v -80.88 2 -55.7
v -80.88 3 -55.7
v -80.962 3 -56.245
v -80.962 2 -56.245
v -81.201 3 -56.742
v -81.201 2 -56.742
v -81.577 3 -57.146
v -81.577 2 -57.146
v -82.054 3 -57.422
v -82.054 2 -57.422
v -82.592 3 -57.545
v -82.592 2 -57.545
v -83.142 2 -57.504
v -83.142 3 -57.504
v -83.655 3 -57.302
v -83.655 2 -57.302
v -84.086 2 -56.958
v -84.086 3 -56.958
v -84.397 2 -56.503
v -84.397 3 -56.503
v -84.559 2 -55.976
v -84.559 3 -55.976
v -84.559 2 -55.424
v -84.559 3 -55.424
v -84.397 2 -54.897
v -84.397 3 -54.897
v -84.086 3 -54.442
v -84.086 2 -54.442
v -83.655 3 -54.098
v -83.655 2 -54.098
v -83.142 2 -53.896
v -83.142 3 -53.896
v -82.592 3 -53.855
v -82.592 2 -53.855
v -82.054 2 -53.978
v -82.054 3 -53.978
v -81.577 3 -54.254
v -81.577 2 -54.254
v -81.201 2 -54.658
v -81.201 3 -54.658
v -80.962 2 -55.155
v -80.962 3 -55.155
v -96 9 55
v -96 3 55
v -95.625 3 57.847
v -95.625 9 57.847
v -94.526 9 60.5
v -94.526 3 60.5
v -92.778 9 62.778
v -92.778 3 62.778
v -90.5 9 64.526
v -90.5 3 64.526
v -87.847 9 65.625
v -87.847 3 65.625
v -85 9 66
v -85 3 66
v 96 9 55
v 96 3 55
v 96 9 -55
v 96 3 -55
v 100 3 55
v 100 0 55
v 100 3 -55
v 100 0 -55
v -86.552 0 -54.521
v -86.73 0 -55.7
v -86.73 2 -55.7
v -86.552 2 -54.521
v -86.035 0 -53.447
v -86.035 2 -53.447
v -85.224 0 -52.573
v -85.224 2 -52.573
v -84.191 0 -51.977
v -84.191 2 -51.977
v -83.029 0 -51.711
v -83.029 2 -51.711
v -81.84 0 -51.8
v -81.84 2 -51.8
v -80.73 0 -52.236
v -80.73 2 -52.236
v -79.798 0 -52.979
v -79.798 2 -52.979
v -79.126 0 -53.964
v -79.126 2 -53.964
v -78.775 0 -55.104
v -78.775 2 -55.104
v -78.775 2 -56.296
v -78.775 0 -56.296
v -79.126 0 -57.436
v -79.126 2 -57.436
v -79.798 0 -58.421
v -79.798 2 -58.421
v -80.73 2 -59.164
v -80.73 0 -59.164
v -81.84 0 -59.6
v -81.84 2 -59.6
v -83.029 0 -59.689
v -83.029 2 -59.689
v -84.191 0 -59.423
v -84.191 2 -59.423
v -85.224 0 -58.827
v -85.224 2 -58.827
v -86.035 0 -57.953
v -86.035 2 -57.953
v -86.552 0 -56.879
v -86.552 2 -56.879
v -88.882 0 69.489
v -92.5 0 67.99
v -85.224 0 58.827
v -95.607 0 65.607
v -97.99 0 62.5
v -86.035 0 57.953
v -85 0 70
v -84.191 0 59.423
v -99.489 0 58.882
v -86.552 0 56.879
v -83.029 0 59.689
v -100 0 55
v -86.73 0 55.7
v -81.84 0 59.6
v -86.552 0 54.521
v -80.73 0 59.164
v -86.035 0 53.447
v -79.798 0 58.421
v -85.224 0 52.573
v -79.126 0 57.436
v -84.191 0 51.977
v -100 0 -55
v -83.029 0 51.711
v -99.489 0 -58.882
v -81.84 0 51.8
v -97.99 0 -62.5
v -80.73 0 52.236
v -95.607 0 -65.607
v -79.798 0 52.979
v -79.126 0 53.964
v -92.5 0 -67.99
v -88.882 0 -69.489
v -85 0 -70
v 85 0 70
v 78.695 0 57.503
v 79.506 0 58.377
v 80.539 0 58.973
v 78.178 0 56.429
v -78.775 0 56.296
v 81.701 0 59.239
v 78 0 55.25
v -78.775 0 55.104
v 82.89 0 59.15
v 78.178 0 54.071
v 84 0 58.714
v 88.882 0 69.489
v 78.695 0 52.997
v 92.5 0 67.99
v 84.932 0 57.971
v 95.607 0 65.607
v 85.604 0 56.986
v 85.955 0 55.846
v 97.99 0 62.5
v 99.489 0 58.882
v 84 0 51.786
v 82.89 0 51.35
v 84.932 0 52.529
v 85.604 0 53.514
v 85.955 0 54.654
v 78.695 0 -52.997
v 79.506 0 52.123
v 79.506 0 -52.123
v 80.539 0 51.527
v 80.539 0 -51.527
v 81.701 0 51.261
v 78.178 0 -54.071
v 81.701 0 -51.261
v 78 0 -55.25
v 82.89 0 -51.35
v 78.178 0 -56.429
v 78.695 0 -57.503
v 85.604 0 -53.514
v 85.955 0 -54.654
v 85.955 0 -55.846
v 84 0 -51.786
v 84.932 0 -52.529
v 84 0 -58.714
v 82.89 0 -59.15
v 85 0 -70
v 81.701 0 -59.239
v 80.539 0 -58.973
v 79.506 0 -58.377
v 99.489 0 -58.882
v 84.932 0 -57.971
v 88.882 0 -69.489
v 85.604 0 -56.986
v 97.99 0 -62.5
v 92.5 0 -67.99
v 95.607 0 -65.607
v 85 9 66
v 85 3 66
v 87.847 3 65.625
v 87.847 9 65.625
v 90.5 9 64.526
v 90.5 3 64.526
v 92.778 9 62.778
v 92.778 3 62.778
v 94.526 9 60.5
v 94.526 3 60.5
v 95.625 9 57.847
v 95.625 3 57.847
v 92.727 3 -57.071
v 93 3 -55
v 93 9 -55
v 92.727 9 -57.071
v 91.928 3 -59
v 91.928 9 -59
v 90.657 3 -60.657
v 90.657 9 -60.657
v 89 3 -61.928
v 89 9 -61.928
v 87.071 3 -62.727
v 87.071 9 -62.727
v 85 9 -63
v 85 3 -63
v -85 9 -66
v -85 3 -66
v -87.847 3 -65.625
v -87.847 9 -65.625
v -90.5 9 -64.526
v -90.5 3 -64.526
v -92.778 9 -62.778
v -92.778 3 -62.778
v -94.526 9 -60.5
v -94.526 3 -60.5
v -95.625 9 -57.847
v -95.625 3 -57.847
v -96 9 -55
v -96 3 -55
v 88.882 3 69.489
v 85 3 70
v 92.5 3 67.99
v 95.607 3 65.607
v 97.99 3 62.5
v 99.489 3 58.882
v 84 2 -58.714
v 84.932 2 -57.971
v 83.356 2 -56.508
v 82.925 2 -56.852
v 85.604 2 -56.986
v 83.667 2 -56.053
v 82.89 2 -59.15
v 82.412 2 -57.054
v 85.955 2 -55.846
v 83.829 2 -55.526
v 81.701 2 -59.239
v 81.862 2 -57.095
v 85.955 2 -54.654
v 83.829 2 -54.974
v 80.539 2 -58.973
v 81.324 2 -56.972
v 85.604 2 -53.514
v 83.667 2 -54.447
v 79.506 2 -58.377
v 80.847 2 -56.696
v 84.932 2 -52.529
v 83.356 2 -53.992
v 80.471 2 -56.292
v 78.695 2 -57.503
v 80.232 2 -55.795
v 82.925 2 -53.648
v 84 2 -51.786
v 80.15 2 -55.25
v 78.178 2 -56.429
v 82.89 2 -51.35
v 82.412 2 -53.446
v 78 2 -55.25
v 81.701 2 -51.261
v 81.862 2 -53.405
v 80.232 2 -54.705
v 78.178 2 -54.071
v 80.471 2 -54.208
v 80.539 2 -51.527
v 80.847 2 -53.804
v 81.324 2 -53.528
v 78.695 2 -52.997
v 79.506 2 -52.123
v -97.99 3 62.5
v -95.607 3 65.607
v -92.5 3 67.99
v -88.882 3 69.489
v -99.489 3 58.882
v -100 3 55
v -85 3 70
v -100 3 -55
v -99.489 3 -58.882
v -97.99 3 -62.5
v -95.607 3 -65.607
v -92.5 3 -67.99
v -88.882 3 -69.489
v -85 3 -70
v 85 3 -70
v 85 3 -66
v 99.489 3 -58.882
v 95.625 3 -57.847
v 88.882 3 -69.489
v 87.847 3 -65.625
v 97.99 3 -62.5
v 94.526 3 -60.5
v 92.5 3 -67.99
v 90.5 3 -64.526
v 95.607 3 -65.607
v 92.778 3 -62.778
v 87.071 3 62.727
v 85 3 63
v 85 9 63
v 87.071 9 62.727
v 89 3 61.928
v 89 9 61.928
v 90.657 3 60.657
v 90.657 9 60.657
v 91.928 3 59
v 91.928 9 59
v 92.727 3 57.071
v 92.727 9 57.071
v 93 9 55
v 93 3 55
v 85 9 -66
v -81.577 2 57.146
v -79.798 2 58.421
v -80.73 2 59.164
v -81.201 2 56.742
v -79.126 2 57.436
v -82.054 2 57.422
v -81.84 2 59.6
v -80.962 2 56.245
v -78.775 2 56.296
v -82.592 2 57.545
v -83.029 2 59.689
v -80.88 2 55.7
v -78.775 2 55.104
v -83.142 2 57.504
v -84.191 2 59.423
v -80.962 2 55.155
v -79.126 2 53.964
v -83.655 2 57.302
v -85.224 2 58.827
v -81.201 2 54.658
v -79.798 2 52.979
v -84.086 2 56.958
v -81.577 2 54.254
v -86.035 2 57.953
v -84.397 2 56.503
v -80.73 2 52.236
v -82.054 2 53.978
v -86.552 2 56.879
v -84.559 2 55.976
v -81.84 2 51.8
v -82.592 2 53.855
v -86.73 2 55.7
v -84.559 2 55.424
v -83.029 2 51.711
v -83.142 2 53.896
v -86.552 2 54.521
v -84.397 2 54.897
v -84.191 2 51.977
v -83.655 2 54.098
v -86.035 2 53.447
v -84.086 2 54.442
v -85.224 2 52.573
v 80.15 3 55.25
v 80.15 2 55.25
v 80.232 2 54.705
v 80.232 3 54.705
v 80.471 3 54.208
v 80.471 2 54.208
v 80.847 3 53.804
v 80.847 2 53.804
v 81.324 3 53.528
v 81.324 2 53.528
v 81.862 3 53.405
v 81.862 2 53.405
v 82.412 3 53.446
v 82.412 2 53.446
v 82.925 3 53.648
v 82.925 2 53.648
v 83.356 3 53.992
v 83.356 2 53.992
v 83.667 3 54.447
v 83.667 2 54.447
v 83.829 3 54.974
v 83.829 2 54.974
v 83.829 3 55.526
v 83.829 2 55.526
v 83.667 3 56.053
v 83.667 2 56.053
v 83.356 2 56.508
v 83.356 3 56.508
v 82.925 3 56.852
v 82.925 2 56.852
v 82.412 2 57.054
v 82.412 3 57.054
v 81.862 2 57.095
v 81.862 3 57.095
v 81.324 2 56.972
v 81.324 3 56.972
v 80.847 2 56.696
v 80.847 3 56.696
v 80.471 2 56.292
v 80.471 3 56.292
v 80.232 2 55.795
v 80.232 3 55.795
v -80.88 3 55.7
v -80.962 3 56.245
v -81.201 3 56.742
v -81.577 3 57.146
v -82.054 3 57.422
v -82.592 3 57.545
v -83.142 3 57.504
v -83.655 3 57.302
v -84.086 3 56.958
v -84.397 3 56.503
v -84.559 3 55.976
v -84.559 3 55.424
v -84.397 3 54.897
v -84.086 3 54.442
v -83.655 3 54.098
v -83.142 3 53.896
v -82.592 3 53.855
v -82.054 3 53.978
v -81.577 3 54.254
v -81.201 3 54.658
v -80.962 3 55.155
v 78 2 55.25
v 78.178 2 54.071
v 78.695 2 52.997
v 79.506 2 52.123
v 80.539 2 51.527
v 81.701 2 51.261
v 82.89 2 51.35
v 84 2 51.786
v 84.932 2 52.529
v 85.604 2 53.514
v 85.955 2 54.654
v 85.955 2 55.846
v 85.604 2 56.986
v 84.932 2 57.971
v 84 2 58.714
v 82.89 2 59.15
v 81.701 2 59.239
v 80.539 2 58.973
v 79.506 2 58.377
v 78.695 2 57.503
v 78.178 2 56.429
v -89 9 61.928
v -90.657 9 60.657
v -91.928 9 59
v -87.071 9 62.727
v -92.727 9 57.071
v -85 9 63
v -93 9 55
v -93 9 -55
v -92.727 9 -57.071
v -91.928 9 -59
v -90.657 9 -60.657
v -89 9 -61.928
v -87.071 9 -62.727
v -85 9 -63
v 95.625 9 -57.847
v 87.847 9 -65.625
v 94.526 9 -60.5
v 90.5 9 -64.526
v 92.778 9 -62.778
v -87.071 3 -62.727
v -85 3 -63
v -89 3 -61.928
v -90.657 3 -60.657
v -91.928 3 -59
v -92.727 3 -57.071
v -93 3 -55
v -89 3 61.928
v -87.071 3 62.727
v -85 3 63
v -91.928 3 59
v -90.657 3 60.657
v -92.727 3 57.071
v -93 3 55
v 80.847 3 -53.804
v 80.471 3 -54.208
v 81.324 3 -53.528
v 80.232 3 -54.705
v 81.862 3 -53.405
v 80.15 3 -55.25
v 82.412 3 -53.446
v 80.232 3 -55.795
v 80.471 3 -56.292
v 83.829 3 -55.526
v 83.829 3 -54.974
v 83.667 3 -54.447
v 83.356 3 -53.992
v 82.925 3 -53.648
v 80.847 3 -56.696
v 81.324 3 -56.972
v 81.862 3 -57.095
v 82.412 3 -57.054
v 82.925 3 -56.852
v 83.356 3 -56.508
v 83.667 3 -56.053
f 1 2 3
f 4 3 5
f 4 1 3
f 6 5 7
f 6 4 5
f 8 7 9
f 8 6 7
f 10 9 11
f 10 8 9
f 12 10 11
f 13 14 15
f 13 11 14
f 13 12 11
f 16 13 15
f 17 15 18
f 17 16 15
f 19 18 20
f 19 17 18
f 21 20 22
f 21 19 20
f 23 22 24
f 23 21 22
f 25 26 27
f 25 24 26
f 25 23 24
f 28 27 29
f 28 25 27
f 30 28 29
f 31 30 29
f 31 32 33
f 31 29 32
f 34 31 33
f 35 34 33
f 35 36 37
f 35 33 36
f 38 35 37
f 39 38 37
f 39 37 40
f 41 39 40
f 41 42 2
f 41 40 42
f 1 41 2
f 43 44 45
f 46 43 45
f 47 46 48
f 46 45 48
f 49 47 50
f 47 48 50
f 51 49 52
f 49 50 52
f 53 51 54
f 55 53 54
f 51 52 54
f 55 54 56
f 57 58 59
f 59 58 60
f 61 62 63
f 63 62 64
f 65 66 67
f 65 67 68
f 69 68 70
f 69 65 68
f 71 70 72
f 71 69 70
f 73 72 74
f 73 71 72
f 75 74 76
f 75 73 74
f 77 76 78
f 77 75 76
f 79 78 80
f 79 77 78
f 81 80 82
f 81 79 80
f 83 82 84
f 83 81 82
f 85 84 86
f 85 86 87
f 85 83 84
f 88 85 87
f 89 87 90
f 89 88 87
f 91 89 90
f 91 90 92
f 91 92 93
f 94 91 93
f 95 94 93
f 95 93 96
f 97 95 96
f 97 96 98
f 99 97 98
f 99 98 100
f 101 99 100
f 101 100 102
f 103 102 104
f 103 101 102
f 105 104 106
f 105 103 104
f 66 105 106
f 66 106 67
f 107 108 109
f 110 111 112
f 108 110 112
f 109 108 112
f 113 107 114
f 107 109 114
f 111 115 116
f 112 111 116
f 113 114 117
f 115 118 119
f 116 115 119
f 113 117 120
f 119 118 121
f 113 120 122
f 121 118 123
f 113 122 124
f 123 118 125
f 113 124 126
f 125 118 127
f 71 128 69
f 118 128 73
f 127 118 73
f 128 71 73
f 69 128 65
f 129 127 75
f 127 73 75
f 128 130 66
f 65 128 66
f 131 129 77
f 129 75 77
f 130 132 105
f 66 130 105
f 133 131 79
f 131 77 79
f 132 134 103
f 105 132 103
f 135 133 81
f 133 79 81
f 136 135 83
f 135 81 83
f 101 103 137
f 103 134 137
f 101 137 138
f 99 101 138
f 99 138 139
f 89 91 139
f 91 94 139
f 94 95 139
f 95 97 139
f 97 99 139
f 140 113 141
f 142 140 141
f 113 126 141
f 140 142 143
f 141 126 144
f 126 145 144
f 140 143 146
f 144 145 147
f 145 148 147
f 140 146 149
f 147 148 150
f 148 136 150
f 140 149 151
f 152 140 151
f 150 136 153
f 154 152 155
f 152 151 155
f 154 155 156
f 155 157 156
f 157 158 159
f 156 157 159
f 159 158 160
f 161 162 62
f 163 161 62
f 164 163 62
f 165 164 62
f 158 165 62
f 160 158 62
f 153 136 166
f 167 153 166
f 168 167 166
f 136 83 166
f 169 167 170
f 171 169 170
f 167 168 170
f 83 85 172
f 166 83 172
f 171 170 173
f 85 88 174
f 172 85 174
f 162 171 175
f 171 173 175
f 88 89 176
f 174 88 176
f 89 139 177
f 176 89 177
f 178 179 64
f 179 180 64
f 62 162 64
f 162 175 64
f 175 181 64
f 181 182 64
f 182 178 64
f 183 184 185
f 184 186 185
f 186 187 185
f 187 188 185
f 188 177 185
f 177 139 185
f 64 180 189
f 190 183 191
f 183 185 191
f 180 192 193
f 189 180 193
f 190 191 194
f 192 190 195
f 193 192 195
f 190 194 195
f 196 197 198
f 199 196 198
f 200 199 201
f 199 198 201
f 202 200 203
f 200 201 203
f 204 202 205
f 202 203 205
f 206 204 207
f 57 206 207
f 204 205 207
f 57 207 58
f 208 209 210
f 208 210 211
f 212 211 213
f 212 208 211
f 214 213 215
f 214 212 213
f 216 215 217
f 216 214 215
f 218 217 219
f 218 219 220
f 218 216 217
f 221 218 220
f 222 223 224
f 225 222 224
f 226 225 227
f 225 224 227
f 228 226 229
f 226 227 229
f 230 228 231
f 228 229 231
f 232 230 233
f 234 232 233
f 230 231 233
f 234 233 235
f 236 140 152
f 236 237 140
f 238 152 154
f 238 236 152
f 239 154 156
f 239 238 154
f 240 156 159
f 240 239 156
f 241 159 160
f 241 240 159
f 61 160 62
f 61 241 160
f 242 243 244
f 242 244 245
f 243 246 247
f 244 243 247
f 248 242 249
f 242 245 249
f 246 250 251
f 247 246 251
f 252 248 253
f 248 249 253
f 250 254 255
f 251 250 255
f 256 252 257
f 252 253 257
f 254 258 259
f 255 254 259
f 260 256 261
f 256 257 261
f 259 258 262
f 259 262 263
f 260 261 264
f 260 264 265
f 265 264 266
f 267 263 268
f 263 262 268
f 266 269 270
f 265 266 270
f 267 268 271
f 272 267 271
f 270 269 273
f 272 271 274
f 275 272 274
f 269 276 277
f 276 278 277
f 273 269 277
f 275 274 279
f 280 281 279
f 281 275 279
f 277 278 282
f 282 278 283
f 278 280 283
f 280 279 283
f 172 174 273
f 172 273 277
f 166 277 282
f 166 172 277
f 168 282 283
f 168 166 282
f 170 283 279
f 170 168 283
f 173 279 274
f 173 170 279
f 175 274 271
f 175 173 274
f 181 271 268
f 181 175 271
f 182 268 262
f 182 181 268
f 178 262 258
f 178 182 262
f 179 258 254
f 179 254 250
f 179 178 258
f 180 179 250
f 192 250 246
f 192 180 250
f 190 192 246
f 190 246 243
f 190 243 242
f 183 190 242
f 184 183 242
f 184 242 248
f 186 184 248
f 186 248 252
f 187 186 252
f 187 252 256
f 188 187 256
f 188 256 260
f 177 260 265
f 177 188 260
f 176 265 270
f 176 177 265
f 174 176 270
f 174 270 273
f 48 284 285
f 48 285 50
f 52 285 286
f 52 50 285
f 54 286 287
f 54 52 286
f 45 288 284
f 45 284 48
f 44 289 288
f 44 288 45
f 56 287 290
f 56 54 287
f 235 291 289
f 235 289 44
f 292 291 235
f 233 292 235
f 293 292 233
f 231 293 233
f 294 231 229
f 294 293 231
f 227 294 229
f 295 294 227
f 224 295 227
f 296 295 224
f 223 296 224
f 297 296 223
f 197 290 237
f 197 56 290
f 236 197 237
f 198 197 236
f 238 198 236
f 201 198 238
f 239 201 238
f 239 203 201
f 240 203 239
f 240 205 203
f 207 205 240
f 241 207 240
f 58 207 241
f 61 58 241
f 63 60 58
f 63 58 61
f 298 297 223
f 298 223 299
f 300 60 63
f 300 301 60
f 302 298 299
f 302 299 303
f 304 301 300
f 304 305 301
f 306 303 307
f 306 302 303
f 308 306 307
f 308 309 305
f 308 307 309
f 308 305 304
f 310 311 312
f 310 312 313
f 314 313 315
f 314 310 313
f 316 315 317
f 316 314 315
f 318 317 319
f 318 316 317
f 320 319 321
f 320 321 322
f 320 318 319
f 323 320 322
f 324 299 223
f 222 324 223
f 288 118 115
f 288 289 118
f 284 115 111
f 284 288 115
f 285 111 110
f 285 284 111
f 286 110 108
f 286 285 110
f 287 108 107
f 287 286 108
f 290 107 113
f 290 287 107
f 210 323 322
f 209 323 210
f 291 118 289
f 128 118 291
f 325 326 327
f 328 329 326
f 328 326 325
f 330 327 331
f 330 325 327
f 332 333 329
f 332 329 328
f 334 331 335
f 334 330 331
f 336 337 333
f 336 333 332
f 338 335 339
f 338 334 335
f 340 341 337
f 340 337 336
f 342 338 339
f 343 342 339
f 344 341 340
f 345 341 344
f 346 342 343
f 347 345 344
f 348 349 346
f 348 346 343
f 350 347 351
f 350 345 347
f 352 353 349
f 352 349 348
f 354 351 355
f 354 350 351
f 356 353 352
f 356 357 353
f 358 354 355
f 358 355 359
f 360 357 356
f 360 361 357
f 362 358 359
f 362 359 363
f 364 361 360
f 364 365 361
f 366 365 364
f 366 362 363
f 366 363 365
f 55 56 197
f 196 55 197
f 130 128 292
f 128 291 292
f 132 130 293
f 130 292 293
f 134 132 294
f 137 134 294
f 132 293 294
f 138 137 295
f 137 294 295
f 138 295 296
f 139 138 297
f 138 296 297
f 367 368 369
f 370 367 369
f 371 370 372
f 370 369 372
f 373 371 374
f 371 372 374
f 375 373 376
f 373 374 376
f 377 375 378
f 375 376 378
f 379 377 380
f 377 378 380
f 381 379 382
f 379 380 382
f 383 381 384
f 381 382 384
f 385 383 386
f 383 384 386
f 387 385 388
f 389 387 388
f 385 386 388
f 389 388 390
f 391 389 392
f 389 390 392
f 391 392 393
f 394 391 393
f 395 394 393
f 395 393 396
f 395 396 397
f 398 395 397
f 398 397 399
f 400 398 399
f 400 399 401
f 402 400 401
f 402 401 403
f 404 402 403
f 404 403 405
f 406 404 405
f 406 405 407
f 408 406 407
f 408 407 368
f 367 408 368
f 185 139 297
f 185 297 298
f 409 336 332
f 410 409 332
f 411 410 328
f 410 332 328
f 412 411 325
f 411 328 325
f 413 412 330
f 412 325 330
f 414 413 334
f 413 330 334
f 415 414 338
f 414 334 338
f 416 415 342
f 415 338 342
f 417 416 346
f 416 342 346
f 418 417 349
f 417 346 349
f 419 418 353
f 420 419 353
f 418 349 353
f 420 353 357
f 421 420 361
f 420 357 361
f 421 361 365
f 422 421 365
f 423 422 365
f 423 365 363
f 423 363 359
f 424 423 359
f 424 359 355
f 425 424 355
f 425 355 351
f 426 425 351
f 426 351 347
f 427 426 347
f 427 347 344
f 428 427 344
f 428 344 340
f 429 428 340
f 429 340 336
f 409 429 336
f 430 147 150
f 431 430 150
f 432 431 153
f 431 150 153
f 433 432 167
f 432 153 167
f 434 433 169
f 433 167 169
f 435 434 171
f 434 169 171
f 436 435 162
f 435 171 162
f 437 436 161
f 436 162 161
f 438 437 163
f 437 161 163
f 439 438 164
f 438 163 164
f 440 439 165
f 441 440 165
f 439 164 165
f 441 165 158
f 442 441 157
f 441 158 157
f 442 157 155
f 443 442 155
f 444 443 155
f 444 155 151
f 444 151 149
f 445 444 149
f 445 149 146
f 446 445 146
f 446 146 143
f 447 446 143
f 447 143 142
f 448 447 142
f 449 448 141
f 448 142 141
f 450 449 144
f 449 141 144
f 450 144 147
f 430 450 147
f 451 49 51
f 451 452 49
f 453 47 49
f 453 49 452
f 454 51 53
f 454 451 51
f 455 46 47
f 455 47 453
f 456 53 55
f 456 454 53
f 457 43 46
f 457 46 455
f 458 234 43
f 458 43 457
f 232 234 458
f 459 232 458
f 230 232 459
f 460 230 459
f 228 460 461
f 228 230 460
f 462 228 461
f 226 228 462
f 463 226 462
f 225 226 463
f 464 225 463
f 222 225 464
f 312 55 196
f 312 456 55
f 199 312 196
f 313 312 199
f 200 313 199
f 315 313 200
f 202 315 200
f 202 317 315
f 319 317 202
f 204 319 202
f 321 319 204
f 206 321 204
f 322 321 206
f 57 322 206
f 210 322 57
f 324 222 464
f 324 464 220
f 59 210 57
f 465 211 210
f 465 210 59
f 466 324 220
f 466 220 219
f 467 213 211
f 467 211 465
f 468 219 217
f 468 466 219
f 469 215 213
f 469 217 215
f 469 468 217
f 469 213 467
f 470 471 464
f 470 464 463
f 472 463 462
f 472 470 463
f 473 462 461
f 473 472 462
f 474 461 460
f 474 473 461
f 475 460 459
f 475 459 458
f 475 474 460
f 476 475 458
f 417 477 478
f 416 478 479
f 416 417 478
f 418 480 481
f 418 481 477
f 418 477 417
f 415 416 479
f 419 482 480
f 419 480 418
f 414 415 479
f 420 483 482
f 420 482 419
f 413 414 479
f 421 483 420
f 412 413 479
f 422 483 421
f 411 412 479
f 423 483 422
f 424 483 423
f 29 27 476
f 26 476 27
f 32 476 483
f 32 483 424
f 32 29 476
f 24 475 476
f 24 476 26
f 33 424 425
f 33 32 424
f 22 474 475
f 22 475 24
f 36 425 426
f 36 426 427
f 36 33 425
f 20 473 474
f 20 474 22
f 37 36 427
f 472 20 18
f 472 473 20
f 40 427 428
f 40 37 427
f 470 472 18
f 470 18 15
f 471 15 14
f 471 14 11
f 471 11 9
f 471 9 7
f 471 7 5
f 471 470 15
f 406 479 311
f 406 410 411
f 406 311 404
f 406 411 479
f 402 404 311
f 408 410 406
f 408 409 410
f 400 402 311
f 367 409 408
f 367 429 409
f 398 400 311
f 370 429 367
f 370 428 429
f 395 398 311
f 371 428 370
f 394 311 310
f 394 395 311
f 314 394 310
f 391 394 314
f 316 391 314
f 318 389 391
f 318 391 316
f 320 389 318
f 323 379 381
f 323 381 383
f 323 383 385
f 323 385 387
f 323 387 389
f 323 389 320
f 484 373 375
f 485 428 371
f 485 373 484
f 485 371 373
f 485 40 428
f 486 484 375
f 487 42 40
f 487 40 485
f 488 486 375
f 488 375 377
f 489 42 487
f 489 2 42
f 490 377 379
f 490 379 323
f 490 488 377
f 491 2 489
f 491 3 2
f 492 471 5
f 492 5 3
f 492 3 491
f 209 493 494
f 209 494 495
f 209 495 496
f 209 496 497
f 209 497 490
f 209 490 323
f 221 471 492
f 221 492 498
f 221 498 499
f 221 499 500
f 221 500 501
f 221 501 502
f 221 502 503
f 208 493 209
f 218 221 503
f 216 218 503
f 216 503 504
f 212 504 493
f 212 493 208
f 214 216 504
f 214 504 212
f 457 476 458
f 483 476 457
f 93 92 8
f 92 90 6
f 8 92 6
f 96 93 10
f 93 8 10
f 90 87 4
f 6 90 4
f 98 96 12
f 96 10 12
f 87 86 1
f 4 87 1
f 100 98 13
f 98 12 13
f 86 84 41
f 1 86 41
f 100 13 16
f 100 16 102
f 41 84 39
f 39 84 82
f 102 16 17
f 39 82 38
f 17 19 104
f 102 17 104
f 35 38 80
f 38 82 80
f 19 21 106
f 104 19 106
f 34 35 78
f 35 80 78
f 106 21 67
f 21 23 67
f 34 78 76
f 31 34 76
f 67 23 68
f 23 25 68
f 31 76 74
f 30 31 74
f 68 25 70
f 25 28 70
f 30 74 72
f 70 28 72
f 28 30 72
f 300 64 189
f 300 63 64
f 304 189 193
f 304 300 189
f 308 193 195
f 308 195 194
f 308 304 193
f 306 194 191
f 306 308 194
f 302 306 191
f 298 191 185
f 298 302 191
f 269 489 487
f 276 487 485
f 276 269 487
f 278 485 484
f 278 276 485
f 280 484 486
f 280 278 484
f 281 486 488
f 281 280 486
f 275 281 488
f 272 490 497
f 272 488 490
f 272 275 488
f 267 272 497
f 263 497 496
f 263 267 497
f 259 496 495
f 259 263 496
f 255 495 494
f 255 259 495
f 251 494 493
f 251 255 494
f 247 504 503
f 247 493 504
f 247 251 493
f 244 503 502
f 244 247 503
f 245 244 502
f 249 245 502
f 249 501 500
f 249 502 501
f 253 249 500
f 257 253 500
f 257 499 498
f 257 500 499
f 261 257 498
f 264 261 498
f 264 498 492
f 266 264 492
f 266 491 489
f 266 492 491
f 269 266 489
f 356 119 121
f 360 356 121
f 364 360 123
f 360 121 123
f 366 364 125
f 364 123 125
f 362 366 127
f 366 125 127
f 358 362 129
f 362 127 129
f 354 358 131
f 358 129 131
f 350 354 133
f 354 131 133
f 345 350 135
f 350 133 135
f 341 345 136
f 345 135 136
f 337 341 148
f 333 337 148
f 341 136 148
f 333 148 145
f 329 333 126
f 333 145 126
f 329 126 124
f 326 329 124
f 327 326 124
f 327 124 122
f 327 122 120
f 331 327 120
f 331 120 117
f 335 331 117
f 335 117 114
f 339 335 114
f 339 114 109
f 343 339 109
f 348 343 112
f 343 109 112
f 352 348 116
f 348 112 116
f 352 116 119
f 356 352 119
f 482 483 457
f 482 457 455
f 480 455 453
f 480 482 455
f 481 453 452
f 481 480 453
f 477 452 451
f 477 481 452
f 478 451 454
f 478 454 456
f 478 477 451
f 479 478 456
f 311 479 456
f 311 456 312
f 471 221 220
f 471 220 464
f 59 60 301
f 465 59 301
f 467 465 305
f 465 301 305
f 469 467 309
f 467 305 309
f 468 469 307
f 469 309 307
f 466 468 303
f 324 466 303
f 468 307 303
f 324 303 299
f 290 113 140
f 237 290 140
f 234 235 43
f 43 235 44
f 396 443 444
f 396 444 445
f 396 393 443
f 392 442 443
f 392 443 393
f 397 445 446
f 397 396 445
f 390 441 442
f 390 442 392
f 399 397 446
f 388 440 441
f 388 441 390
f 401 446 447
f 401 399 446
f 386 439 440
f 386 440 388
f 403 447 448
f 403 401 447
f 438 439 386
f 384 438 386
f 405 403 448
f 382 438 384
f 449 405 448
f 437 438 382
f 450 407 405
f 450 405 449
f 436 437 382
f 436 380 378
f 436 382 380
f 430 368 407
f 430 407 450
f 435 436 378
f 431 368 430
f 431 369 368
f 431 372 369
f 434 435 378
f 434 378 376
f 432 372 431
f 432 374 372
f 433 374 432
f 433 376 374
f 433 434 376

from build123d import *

# Parameters (mm, degrees)
SKETCH1_W           = 200
SKETCH1_H           = 140
BOSS_EXTRUDE1_DEPTH = 3
FILLET1_R           = 15
BOSS_EXTRUDE2_DEPTH = 6
SKETCH4_R           = 4
CUT_EXTRUDE1_DEPTH  = 2
SKETCH5_R           = 1.85
CUT_EXTRUDE2_DEPTH  = 6
SKETCH6_R           = 4
CUT_EXTRUDE3_DEPTH  = 2
SKETCH7_R           = 1.85
CUT_EXTRUDE4_DEPTH  = 2


with BuildPart() as part:
    # Sketch1 → Boss-Extrude1 (new body)
    with BuildSketch(Plane(origin=(0, 0, 0), x_dir=(1, 0, 0), z_dir=(0, 1, 0))):
        Rectangle(SKETCH1_W, SKETCH1_H)
    extrude(amount=BOSS_EXTRUDE1_DEPTH)

    # Fillet1
    fillet1_edges = [part.edges().sort_by_distance(p)[0] for p in [
        (100, 1.5, 70),
        (-100, 1.5, 70),
        (-100, 1.5, -70),
        (100, 1.5, -70),
    ]]
    fillet(fillet1_edges, radius=FILLET1_R)

    # Sketch3 → Boss-Extrude2 (add)
    with BuildSketch(Plane(origin=(0, 3, 0), x_dir=(1, 0, 0), z_dir=(0, 1, 0))):
        with BuildLine():
            Line((96, -55), (96, 55))
            ThreePointArc((96, 55), (92.778174593, 62.778174593), (85, 66))
            Line((85, 66), (-85, 66))
            ThreePointArc((-85, 66), (-92.778174593, 62.778174593), (-96, 55))
            Line((-96, 55), (-96, -55))
            ThreePointArc((-96, -55), (-92.778174593, -62.778174593), (-85, -66))
            Line((-85, -66), (85, -66))
            ThreePointArc((85, -66), (92.778174593, -62.778174593), (96, -55))
        make_face()
        with BuildLine():
            Line((85, 63), (-85, 63))
            ThreePointArc((-85, 63), (-90.656854249, 60.656854249), (-93, 55))
            Line((-93, 55), (-93, -55))
            ThreePointArc((-93, -55), (-90.656854249, -60.656854249), (-85, -63))
            Line((-85, -63), (85, -63))
            ThreePointArc((85, -63), (90.656854249, -60.656854249), (93, -55))
            Line((93, -55), (93, 55))
            ThreePointArc((93, 55), (90.656854249, 60.656854249), (85, 63))
        make_face(mode=Mode.SUBTRACT)
    extrude(amount=BOSS_EXTRUDE2_DEPTH)

    # Sketch4 → Cut-Extrude1 (cut)
    with BuildSketch(Plane(origin=(0, 0, 0), x_dir=(-1, 0, 0), z_dir=(0, -1, 0))):
        with Locations((82.73, -55.7)):
            Circle(SKETCH4_R)
    cut_extrude1 = extrude(amount=-CUT_EXTRUDE1_DEPTH, mode=Mode.SUBTRACT)

    # Mirror1: Cut-Extrude1 across plane
    add(cut_extrude1.mirror(Plane.XY), mode=Mode.SUBTRACT)

    # Sketch5 → Cut-Extrude2 (cut)
    with BuildSketch(Plane.XZ.offset(-2)):
        with Locations((-82.73, 55.7)):
            Circle(SKETCH5_R)
    cut_extrude2 = extrude(amount=-CUT_EXTRUDE2_DEPTH, mode=Mode.SUBTRACT)

    # Mirror2: Cut-Extrude2 across plane
    add(cut_extrude2.mirror(Plane.XY), mode=Mode.SUBTRACT)

    # Sketch6 → Cut-Extrude3 (cut)
    with BuildSketch(Plane(origin=(0, 0, 0), x_dir=(-1, 0, 0), z_dir=(0, -1, 0))):
        with Locations((-82, -55.25)):
            Circle(SKETCH6_R)
    cut_extrude3 = extrude(amount=-CUT_EXTRUDE3_DEPTH, mode=Mode.SUBTRACT)

    # Mirror3: Cut-Extrude3 across plane
    add(cut_extrude3.mirror(Plane.XY), mode=Mode.SUBTRACT)

    # Sketch7 → Cut-Extrude4 (cut)
    with BuildSketch(Plane(origin=(0, 2, 0), x_dir=(-1, 0, 0), z_dir=(0, -1, 0))):
        with Locations((-82, -55.25)):
            Circle(SKETCH7_R)
    cut_extrude4 = extrude(amount=-CUT_EXTRUDE4_DEPTH, mode=Mode.SUBTRACT)

    # Mirror4: Cut-Extrude4 across plane
    add(cut_extrude4.mirror(Plane.XY), mode=Mode.SUBTRACT)


solid = part.part
